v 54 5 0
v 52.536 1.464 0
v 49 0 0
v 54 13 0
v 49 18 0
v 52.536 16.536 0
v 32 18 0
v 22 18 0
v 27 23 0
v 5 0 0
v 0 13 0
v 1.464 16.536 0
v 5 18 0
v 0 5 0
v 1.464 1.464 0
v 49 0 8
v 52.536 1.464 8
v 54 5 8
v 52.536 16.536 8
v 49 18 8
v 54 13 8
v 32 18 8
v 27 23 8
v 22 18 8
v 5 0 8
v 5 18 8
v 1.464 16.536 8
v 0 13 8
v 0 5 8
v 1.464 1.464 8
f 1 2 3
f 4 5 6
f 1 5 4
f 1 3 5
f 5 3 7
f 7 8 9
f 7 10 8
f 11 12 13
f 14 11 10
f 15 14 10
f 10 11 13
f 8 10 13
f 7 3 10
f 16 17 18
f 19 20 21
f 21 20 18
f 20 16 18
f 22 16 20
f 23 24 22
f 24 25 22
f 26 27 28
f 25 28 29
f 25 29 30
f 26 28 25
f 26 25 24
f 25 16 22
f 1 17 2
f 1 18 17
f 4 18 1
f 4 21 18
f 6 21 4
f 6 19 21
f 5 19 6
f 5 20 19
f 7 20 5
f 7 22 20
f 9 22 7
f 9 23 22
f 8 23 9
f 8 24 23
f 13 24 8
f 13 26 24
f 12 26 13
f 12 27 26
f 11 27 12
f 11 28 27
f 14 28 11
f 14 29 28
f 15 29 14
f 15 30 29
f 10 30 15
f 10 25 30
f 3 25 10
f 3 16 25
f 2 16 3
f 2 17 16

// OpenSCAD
$fn = 32;

// ----------------------------------------------------------------------
// Ratchet pawl: 54 x 18 mm body, beak 5 mm сверху
// ----------------------------------------------------------------------

// --- parameters (mm) ---
profile_height = 8;       // extrusion height
profile_points = 15;      // points of the closed outline

profile = [[0, 5], [1.464, 1.464], [5, 0], [49, 0], [52.536, 1.464], [54, 5], [54, 13], [52.536, 16.536], [49, 18], [32, 18], [27, 23], [22, 18], [5, 18], [1.464, 16.536], [0, 13]];  // single closed polygon, 15 points, counter clockwise

// --- the one profile operation ---
linear_extrude(height = profile_height) polygon(points = profile);
